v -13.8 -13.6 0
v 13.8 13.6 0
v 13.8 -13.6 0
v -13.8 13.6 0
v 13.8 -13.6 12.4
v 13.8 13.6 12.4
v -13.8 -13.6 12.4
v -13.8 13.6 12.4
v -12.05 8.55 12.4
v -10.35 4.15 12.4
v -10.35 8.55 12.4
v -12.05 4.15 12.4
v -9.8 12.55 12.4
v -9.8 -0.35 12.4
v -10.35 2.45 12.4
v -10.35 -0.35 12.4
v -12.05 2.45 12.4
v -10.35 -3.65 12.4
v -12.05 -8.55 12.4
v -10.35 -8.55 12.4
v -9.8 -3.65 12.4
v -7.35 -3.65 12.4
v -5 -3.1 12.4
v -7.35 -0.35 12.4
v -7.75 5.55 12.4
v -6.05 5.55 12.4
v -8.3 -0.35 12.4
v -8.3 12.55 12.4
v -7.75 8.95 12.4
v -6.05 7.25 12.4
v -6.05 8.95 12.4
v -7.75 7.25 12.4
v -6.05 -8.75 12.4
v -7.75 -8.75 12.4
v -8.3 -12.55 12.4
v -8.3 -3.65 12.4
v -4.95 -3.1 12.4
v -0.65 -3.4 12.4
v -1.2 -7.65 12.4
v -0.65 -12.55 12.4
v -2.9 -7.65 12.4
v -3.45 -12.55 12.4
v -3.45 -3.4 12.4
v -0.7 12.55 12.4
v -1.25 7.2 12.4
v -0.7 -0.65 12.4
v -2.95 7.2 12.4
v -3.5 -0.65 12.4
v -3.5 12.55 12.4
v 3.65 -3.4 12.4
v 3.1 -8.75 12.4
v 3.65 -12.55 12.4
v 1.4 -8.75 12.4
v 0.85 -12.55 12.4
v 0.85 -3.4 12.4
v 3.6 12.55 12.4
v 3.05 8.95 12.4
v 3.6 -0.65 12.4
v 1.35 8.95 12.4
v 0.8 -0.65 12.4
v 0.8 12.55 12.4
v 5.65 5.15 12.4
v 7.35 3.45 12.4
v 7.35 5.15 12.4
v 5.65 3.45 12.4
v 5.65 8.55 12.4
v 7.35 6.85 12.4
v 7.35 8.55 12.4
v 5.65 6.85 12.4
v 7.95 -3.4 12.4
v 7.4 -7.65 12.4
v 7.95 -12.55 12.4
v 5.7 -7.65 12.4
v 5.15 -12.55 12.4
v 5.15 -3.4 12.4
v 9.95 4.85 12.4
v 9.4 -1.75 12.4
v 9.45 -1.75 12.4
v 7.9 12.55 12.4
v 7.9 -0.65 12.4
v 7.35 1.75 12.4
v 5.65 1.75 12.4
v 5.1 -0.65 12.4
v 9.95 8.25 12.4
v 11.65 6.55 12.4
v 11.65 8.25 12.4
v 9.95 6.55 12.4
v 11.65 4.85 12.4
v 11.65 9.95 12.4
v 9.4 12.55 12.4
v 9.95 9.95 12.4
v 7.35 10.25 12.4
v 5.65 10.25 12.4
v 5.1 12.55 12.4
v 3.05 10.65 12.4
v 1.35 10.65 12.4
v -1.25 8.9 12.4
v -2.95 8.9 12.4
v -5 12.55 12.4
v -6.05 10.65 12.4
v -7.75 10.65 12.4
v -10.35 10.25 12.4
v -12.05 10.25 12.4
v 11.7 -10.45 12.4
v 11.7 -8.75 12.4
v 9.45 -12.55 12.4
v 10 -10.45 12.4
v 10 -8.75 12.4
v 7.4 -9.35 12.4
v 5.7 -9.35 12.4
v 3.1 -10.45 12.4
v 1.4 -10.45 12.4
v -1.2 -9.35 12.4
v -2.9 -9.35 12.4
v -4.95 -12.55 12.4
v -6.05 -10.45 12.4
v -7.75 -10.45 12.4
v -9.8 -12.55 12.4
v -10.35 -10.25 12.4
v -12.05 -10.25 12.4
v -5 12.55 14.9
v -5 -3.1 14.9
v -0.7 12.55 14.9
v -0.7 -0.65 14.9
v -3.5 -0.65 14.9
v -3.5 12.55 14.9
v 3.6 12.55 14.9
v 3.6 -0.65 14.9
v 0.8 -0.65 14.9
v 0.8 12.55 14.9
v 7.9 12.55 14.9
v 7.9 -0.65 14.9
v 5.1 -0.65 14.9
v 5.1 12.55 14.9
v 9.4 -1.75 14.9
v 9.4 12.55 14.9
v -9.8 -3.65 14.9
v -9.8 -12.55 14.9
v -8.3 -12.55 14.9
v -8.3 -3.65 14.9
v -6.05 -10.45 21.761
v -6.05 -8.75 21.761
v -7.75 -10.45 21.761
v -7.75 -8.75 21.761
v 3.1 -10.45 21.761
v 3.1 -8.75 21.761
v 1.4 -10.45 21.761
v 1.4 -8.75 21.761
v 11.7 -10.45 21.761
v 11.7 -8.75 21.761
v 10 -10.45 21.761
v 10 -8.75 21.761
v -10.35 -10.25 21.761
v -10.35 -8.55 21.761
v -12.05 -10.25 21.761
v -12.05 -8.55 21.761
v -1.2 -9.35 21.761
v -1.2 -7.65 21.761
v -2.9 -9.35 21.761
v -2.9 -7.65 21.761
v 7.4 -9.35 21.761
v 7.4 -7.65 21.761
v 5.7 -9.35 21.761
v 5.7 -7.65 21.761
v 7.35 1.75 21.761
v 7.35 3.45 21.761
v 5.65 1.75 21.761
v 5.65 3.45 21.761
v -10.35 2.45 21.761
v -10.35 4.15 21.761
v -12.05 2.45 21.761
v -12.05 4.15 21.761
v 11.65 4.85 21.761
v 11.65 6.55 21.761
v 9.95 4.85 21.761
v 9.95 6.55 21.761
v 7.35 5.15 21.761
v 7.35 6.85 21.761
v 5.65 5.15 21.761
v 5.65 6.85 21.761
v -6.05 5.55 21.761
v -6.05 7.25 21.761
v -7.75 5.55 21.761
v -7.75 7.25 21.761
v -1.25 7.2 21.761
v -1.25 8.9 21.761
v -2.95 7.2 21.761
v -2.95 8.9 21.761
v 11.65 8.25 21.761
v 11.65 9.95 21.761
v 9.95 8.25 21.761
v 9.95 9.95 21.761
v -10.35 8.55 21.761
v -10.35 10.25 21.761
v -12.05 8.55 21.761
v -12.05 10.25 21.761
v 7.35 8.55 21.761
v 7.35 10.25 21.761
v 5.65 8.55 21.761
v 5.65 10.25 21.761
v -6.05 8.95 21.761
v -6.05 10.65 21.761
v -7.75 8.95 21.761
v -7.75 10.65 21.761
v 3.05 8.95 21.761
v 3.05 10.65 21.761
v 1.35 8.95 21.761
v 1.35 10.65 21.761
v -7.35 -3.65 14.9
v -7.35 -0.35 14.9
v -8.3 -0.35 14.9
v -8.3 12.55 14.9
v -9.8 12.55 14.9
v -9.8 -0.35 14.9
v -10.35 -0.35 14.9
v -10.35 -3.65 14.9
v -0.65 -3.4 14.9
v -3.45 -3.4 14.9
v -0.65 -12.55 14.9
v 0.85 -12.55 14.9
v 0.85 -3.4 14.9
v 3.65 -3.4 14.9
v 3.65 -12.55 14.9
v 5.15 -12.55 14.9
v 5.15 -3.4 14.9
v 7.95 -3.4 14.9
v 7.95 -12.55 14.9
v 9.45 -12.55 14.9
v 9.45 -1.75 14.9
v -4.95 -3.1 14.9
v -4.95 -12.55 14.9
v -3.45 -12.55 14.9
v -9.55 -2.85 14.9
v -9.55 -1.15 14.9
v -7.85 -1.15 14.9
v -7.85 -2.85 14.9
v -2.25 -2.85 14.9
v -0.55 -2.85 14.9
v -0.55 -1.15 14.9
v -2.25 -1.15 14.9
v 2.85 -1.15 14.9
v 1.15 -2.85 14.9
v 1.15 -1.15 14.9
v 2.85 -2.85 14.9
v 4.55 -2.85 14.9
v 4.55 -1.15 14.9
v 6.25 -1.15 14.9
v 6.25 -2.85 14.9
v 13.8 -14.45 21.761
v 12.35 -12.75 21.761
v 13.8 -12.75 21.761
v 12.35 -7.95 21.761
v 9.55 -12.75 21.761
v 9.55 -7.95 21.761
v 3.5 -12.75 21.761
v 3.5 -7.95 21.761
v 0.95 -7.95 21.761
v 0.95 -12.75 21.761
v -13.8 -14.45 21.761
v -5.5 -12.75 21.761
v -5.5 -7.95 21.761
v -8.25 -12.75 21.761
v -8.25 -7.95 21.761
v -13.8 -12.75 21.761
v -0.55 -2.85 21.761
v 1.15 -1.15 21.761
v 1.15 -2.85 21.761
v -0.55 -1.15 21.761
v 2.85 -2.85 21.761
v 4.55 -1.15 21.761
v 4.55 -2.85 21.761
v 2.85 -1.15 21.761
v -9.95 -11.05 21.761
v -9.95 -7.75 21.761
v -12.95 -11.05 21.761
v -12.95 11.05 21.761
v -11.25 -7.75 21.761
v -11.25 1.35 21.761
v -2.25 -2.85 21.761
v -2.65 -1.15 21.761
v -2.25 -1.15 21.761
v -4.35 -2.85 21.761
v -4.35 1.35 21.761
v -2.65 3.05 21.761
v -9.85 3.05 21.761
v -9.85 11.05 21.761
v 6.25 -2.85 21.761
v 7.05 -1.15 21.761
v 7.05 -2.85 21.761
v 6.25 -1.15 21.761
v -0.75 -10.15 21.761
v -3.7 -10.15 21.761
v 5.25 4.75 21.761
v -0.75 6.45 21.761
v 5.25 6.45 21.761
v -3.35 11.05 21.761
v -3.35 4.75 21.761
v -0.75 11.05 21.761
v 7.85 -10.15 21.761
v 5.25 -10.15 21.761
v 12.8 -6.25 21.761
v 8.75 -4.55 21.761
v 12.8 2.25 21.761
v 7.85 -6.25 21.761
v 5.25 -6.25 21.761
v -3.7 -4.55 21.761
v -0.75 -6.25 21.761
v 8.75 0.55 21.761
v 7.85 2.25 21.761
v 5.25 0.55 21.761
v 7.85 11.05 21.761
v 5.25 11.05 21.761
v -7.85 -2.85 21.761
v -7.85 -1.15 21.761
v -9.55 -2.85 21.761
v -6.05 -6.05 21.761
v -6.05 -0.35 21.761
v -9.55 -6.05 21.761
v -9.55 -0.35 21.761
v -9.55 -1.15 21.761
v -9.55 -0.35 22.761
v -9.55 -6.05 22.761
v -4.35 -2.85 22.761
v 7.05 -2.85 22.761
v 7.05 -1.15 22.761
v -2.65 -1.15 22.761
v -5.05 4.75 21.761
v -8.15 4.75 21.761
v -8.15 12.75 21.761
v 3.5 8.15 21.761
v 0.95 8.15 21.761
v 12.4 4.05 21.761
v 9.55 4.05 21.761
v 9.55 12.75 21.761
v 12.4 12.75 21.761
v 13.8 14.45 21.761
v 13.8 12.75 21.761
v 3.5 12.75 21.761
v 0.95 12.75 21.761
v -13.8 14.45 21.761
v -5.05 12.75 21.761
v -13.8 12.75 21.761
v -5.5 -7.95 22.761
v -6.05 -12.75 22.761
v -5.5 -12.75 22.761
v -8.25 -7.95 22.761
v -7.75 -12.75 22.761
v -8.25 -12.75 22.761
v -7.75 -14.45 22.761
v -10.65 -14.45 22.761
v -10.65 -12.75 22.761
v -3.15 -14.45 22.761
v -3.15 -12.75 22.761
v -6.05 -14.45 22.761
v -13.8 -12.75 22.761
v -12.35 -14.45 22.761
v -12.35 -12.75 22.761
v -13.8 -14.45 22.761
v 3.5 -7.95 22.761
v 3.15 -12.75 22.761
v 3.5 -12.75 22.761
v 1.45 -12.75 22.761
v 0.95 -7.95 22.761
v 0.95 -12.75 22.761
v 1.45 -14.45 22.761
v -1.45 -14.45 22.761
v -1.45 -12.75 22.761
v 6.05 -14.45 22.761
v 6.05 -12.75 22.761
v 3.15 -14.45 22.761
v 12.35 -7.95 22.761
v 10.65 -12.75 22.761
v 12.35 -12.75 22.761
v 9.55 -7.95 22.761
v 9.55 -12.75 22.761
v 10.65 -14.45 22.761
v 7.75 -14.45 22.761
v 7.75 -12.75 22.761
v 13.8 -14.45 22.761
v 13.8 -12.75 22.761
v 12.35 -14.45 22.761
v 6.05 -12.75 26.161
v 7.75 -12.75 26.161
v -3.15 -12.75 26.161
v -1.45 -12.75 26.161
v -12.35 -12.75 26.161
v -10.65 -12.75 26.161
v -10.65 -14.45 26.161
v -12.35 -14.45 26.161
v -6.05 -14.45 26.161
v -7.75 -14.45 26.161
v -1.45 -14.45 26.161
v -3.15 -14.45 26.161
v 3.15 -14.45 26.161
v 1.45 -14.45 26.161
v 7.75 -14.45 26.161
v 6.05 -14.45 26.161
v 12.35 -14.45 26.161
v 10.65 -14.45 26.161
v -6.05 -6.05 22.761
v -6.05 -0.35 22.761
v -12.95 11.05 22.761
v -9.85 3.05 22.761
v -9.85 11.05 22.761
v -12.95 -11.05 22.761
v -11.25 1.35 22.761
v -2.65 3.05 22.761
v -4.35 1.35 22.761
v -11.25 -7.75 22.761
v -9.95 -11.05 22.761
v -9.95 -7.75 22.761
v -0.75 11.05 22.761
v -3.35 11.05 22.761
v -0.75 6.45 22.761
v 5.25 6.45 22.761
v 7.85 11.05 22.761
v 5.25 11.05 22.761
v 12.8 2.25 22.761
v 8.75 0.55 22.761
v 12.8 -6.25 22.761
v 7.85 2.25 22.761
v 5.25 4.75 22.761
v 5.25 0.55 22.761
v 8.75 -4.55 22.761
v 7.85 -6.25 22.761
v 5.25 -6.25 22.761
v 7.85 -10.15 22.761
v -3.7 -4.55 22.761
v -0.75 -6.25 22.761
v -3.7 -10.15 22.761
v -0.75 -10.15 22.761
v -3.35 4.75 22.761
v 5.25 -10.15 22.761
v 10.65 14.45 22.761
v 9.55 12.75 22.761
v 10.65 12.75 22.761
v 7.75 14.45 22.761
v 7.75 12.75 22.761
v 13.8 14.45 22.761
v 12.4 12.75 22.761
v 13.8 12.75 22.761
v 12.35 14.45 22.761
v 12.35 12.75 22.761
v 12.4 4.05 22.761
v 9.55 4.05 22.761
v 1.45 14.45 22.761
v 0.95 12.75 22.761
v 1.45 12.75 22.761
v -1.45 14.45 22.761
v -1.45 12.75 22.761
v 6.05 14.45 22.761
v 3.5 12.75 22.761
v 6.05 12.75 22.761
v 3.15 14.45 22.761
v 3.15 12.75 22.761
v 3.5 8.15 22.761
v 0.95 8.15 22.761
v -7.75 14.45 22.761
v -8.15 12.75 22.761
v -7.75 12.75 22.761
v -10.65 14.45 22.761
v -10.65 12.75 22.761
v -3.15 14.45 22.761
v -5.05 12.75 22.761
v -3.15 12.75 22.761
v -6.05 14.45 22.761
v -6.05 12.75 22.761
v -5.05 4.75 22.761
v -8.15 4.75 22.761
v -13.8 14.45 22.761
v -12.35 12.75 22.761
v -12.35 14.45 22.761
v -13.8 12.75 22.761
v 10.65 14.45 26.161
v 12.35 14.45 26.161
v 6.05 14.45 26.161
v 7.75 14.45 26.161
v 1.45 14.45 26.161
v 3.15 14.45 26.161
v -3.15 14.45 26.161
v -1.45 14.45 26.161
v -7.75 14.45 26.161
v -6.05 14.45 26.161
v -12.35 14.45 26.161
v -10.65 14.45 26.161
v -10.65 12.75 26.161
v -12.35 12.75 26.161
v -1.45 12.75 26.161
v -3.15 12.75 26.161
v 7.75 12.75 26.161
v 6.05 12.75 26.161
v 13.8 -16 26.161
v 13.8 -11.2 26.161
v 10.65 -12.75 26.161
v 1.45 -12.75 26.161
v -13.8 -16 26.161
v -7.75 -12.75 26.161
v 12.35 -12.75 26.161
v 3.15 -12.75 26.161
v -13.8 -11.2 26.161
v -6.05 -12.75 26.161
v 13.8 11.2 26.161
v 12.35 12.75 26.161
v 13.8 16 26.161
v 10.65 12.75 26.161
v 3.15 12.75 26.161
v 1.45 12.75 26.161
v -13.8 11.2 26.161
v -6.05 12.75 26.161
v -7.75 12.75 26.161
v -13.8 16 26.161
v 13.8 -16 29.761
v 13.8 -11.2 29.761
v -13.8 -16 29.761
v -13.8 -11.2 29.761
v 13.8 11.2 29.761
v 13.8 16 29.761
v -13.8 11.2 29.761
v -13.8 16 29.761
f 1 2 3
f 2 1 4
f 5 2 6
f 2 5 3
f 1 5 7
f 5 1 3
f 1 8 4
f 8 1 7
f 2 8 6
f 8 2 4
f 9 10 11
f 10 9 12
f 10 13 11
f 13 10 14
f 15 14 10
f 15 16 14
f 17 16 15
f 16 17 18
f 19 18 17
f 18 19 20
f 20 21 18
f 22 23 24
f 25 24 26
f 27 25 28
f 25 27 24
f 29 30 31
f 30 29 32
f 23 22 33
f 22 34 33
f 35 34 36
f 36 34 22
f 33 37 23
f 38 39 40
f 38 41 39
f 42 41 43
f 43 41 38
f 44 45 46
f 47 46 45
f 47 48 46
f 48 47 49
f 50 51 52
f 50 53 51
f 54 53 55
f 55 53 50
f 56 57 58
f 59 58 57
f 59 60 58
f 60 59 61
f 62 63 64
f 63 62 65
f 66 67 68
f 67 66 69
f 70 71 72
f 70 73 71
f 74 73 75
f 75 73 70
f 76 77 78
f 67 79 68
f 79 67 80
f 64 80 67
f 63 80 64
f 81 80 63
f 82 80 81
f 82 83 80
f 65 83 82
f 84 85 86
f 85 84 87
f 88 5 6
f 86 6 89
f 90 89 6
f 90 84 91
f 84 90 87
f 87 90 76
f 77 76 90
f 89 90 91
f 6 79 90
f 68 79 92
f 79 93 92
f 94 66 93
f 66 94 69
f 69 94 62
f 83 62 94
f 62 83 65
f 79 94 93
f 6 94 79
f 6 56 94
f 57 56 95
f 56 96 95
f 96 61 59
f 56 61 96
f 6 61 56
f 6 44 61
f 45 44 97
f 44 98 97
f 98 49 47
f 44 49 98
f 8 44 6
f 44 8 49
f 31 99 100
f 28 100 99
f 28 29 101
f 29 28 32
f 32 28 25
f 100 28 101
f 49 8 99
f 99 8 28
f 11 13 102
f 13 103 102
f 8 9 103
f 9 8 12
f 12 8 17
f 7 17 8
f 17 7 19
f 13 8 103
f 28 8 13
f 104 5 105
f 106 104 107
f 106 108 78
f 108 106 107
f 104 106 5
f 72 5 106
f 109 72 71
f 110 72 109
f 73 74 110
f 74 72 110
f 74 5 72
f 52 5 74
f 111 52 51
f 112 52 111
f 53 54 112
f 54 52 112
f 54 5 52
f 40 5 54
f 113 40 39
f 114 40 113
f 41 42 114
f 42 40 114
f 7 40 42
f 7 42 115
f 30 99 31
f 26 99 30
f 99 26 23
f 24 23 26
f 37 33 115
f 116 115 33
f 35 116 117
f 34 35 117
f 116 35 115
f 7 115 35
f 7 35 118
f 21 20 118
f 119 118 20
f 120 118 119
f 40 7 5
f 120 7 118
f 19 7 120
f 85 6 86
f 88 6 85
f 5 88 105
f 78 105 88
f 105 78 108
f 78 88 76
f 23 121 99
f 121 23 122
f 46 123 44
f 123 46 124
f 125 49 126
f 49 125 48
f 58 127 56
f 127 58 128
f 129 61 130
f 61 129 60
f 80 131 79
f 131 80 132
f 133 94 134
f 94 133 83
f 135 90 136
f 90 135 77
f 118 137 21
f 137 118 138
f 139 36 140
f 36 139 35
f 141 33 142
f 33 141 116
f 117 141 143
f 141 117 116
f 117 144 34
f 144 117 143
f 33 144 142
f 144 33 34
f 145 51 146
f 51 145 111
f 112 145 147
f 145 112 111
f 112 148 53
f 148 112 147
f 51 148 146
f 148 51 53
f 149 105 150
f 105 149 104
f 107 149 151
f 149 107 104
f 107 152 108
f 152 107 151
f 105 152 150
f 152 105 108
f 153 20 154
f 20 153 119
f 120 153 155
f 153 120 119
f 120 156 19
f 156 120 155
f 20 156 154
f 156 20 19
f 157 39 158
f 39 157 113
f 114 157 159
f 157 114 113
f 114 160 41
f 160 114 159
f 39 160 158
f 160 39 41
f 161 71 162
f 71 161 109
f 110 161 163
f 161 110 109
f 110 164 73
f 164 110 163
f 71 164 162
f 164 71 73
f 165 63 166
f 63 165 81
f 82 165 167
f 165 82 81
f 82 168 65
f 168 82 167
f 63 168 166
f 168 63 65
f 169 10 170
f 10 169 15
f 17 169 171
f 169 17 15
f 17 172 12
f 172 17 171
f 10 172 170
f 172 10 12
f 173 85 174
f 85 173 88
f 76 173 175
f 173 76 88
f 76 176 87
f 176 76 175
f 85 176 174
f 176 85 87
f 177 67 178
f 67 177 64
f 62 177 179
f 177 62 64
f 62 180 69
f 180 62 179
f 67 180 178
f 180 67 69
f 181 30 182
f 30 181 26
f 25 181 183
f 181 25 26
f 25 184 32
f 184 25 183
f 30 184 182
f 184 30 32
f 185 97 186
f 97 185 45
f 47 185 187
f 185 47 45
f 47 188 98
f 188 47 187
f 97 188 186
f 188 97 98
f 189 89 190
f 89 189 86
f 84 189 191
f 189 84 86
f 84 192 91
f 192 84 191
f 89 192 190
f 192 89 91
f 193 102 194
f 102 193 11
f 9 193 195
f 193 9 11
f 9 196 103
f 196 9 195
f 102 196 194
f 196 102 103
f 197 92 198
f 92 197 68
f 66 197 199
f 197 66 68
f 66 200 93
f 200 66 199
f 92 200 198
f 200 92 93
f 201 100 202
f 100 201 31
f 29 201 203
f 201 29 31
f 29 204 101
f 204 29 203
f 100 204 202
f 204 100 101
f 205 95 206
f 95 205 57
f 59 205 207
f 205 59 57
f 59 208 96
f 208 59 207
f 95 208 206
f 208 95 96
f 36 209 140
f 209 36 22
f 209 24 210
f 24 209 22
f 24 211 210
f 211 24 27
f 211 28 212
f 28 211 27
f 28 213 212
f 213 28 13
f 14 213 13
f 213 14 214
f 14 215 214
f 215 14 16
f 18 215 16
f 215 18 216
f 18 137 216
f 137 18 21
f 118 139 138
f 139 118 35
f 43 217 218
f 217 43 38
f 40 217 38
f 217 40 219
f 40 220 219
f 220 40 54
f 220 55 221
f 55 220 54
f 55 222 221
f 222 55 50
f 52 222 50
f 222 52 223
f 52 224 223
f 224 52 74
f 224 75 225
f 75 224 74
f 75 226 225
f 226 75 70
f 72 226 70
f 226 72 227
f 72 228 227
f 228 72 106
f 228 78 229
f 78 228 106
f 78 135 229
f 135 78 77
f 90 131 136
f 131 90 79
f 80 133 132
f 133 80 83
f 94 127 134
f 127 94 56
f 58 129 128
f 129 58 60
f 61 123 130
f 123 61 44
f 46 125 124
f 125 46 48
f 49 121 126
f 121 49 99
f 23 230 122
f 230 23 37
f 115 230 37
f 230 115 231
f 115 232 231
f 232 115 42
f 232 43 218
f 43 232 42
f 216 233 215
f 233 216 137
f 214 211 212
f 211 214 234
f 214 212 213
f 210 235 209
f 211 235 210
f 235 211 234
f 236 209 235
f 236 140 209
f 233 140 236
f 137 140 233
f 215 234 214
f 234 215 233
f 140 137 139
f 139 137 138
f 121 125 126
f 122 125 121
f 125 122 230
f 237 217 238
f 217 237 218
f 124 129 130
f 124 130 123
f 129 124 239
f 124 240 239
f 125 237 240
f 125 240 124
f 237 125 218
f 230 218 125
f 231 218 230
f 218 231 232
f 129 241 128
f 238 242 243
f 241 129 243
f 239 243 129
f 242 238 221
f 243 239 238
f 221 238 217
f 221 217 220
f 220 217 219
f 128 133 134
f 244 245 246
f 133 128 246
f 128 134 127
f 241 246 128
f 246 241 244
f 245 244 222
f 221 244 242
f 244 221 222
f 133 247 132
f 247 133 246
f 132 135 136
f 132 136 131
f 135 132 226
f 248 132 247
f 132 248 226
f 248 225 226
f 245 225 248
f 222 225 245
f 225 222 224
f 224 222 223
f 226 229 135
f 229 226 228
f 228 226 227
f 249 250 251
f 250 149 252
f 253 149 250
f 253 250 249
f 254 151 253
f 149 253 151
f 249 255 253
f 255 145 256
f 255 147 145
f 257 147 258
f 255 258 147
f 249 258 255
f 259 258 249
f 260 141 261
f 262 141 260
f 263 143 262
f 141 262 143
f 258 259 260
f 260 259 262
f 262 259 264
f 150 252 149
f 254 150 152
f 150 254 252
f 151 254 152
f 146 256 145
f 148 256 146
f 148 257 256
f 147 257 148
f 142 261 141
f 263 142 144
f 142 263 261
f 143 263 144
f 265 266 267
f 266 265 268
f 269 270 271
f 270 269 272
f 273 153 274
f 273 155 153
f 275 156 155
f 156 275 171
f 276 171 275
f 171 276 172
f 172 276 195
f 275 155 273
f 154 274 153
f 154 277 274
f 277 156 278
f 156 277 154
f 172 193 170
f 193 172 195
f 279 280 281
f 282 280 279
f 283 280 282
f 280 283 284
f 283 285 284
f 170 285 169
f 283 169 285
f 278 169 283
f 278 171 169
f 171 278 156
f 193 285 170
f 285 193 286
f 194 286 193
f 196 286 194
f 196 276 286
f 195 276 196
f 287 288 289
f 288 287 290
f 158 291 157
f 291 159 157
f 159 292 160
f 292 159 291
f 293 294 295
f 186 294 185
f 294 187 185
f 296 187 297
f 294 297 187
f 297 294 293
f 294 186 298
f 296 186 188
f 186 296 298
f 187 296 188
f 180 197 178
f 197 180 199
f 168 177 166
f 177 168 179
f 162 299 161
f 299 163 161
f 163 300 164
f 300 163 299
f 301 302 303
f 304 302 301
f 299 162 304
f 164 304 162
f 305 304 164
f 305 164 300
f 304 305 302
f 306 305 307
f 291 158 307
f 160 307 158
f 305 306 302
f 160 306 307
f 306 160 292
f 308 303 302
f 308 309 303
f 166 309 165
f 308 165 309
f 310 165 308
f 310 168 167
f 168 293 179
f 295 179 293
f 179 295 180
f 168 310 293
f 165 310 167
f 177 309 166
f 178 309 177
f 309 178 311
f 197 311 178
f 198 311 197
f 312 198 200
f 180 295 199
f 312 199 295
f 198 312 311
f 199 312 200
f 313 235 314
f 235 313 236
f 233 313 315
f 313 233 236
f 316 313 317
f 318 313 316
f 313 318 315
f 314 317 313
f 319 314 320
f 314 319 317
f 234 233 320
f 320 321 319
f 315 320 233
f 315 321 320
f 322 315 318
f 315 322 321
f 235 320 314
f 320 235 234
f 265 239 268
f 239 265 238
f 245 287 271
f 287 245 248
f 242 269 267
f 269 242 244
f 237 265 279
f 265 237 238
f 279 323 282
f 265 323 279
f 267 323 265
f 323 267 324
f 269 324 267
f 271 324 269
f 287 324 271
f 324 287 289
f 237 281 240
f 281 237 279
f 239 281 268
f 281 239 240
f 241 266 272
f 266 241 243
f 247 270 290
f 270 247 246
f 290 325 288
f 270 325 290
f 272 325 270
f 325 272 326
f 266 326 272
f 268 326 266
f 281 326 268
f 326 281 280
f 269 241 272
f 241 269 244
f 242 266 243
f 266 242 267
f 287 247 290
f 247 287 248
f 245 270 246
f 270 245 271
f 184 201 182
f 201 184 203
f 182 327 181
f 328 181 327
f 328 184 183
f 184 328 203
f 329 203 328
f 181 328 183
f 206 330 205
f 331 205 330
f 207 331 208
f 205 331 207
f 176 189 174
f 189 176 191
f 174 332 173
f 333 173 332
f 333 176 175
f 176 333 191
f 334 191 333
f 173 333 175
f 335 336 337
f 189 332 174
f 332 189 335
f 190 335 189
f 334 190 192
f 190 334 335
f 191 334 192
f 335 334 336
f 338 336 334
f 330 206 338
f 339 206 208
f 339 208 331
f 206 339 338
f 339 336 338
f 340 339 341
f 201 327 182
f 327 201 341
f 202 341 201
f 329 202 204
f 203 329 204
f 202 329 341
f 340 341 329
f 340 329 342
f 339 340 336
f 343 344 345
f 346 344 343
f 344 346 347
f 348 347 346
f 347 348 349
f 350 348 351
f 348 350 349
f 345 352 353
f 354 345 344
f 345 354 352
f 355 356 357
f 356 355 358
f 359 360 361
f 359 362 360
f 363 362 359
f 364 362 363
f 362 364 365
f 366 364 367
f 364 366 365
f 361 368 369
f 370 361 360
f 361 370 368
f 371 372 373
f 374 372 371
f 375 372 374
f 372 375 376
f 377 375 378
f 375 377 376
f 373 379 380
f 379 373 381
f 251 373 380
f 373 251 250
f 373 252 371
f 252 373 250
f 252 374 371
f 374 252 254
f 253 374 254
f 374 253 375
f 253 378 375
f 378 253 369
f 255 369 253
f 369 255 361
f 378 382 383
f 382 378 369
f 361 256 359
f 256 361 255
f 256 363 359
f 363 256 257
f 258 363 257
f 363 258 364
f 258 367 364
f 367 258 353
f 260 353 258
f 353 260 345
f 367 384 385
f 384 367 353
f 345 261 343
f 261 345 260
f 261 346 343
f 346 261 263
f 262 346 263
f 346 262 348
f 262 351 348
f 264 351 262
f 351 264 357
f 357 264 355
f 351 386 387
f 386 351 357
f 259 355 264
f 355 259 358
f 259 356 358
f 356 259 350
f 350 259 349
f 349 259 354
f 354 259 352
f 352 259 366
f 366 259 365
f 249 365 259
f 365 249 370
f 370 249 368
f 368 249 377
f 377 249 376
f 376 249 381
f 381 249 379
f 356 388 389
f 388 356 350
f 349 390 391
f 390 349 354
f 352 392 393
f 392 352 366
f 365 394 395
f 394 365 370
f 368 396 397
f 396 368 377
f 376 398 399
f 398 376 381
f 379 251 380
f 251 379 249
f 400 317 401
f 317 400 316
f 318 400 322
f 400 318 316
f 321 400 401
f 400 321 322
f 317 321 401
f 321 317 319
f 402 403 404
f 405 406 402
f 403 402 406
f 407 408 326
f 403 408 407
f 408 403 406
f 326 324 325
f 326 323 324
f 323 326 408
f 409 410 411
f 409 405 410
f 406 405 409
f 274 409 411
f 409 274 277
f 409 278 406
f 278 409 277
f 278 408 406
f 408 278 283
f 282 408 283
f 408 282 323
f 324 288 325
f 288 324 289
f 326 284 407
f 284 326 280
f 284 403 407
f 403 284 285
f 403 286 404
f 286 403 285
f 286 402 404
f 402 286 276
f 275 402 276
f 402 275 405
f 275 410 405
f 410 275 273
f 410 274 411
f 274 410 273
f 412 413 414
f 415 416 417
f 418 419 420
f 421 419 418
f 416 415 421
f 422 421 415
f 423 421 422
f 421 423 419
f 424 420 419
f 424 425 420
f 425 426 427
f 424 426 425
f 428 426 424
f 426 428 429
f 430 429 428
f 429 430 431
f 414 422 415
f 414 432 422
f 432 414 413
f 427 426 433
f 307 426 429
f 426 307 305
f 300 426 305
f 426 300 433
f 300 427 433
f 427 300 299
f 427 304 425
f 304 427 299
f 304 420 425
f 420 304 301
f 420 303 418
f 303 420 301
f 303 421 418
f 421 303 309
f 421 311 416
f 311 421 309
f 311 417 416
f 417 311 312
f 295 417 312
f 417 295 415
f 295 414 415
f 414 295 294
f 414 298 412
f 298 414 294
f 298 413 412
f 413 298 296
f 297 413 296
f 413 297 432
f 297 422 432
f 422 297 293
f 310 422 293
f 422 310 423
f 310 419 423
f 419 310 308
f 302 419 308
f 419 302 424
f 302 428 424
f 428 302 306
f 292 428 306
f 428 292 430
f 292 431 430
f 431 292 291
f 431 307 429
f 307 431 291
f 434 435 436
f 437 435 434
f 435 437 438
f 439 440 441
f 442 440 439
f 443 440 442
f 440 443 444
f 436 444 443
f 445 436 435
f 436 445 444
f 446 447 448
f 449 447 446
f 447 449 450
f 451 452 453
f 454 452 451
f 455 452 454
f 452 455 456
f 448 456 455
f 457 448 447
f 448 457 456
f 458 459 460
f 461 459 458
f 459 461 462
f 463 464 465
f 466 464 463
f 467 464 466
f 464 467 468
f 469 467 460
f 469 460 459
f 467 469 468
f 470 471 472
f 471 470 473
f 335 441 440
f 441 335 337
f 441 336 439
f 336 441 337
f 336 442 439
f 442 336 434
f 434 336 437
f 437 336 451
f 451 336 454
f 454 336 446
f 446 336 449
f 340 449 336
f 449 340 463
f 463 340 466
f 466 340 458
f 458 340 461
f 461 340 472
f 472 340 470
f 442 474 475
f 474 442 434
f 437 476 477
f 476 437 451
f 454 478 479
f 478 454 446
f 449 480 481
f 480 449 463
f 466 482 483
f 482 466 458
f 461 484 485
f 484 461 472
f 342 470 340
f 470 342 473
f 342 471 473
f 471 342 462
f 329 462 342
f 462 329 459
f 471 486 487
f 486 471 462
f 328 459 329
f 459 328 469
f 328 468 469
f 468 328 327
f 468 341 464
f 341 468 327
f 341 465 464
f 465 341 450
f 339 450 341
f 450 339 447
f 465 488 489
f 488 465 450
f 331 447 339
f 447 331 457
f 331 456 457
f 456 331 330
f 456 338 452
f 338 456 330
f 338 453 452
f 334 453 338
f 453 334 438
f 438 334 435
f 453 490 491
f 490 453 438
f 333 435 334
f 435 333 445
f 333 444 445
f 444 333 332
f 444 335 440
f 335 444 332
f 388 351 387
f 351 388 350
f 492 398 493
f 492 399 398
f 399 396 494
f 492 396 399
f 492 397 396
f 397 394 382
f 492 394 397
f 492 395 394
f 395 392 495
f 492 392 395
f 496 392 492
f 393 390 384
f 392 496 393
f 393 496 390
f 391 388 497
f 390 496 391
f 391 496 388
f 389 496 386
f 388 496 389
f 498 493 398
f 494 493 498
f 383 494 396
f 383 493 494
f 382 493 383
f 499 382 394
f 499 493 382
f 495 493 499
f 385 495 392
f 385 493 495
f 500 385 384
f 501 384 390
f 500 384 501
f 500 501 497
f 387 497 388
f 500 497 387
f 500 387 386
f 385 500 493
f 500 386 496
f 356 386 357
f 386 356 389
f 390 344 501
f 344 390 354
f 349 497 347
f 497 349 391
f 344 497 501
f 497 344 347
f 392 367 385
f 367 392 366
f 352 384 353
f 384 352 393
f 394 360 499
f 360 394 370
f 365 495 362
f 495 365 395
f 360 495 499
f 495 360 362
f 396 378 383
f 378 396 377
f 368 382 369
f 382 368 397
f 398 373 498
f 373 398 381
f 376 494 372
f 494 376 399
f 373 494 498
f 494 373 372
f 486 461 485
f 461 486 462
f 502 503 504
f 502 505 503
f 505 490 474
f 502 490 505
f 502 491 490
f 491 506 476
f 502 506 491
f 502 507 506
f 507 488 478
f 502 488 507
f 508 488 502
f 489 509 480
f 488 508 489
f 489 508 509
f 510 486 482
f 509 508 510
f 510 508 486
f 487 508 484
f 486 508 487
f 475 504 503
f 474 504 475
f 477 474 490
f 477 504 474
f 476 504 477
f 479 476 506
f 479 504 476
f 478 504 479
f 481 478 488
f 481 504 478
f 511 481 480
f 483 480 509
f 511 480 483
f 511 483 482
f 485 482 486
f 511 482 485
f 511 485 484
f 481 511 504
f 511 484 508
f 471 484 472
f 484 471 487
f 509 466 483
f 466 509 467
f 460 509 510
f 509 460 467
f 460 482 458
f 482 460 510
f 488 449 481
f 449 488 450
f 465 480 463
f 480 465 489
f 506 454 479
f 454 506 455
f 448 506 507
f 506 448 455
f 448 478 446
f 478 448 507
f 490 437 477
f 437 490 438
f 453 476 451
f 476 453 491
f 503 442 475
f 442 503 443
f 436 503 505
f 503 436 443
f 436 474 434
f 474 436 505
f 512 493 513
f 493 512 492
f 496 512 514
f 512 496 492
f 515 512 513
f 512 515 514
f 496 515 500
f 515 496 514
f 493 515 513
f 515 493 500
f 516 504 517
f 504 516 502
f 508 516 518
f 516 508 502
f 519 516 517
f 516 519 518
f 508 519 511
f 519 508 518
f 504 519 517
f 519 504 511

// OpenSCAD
// Generated by SolidPython 0.4.2 on 2020-09-29 23:20:18
//!OpenSCAD

scale(v = 0.0100000000) {
	translate(v = [-1380, -1360, 0]) {
		union() {
			color(c = [0.4000000000, 0.4000000000, 0.4000000000]) {
				translate(v = [0, 0, 0]) {
					linear_extrude(height = 1000.0000000000) {
						polygon(paths = [[0, 1, 2, 3]], points = [[0, 0], [0, 2720], [2760, 2720], [2760, 0]]);
					}
				}
			}
			color(c = [0.2000000000, 0.6000000000, 0.2000000000]) {
				translate(v = [0, 0, 1000.0000000000]) {
					linear_extrude(height = 120.0000000000) {
						polygon(paths = [[0, 1, 2, 3]], points = [[0, 1305], [0, 2720], [2760, 2720], [2760, 1305]]);
					}
				}
			}
			color(c = [0.4000000000, 0.4000000000, 0.4000000000]) {
				translate(v = [0, 0, 1000.0000000000]) {
					linear_extrude(height = 120.0000000000) {
						polygon(paths = [[0, 1, 2, 3]], points = [[0, 0], [0, 1305], [2760, 1305], [2760, 0]]);
					}
				}
			}
			color(c = [0.9000000000, 0.6000000000, 0.6000000000]) {
				translate(v = [0, 0, 1120.0000000000]) {
					linear_extrude(height = 120.0000000000) {
						polygon(paths = [[0, 1, 2, 3]], points = [[135, 1485], [135, 2485], [400, 2485], [400, 1485]]);
					}
				}
			}
			color(c = [0.9000000000, 0.6000000000, 0.6000000000]) {
				translate(v = [0, 0, 1120.0000000000]) {
					linear_extrude(height = 120.0000000000) {
						polygon(paths = [[0, 1, 2, 3]], points = [[550, 1485], [550, 2485], [880, 2485], [880, 1485]]);
					}
				}
			}
			color(c = [0.9000000000, 0.6000000000, 0.6000000000]) {
				translate(v = [0, 0, 1120.0000000000]) {
					linear_extrude(height = 120.0000000000) {
						polygon(paths = [[0, 1, 2, 3]], points = [[1030, 1485], [1030, 2485], [1310, 2485], [1310, 1485]]);
					}
				}
			}
			color(c = [0.9000000000, 0.6000000000, 0.6000000000]) {
				translate(v = [0, 0, 1120.0000000000]) {
					linear_extrude(height = 120.0000000000) {
						polygon(paths = [[0, 1, 2, 3]], points = [[1460, 1485], [1460, 2485], [1740, 2485], [1740, 1485]]);
					}
				}
			}
			color(c = [0.9000000000, 0.6000000000, 0.6000000000]) {
				translate(v = [0, 0, 1120.0000000000]) {
					linear_extrude(height = 120.0000000000) {
						polygon(paths = [[0, 1, 2, 3]], points = [[1890, 1485], [1890, 2485], [2170, 2485], [2170, 1485]]);
					}
				}
			}
			color(c = [0.9000000000, 0.6000000000, 0.6000000000]) {
				translate(v = [0, 0, 1120.0000000000]) {
					linear_extrude(height = 120.0000000000) {
						polygon(paths = [[0, 1, 2, 3]], points = [[2320, 1485], [2320, 2485], [2620, 2485], [2620, 1485]]);
					}
				}
			}
			color(c = [0.9000000000, 0.6000000000, 0.9000000000]) {
				translate(v = [0, 0, 1120.0000000000]) {
					linear_extrude(height = 120.0000000000) {
						polygon(paths = [[0, 1, 2, 3]], points = [[135, 235], [135, 655], [400, 655], [400, 235]]);
					}
				}
			}
			color(c = [0.9000000000, 0.6000000000, 0.9000000000]) {
				translate(v = [0, 0, 1120.0000000000]) {
					linear_extrude(height = 120.0000000000) {
						polygon(paths = [[0, 1, 2, 3]], points = [[550, 235], [550, 655], [885, 655], [885, 235]]);
					}
				}
			}
			color(c = [0.9000000000, 0.6000000000, 0.9000000000]) {
				translate(v = [0, 0, 1120.0000000000]) {
					linear_extrude(height = 120.0000000000) {
						polygon(paths = [[0, 1, 2, 3]], points = [[1035, 235], [1035, 655], [1315, 655], [1315, 235]]);
					}
				}
			}
			color(c = [0.9000000000, 0.6000000000, 0.9000000000]) {
				translate(v = [0, 0, 1120.0000000000]) {
					linear_extrude(height = 120.0000000000) {
						polygon(paths = [[0, 1, 2, 3]], points = [[1465, 235], [1465, 655], [1745, 655], [1745, 235]]);
					}
				}
			}
			color(c = [0.9000000000, 0.6000000000, 0.9000000000]) {
				translate(v = [0, 0, 1120.0000000000]) {
					linear_extrude(height = 120.0000000000) {
						polygon(paths = [[0, 1, 2, 3]], points = [[1895, 235], [1895, 655], [2175, 655], [2175, 235]]);
					}
				}
			}
			color(c = [0.9000000000, 0.6000000000, 0.9000000000]) {
				translate(v = [0, 0, 1120.0000000000]) {
					linear_extrude(height = 120.0000000000) {
						polygon(paths = [[0, 1, 2, 3]], points = [[2325, 235], [2325, 655], [2615, 655], [2615, 235]]);
					}
				}
			}
			color(c = [0.2000000000, 0.6000000000, 0.2000000000]) {
				translate(v = [0, 0, 1120.0000000000]) {
					linear_extrude(height = 120.0000000000) {
						difference() {
							polygon(paths = [[0, 1, 2, 3]], points = [[0, 1305], [0, 2720], [2760, 2720], [2760, 1305]]);
							polygon(paths = [[0, 1, 2, 3]], points = [[135, 1485], [400, 1485], [400, 2485], [135, 2485]]);
							polygon(paths = [[0, 1, 2, 3]], points = [[550, 1485], [880, 1485], [880, 2485], [550, 2485]]);
							polygon(paths = [[0, 1, 2, 3]], points = [[1030, 1485], [1310, 1485], [1310, 2485], [1030, 2485]]);
							polygon(paths = [[0, 1, 2, 3]], points = [[1460, 1485], [1740, 1485], [1740, 2485], [1460, 2485]]);
							polygon(paths = [[0, 1, 2, 3]], points = [[1890, 1485], [2170, 1485], [2170, 2485], [1890, 2485]]);
							polygon(paths = [[0, 1, 2, 3]], points = [[2320, 1485], [2620, 1485], [2620, 2485], [2320, 2485]]);
						}
					}
				}
			}
			color(c = [0.4000000000, 0.4000000000, 0.4000000000]) {
				translate(v = [0, 0, 1120.0000000000]) {
					linear_extrude(height = 120.0000000000) {
						difference() {
							polygon(paths = [[0, 1, 2, 3]], points = [[0, 0], [0, 1305], [2760, 1305], [2760, 0]]);
							polygon(paths = [[0, 1, 2, 3]], points = [[135, 235], [400, 235], [400, 655], [135, 655]]);
							polygon(paths = [[0, 1, 2, 3]], points = [[550, 235], [885, 235], [885, 655], [550, 655]]);
							polygon(paths = [[0, 1, 2, 3]], points = [[1035, 235], [1315, 235], [1315, 655], [1035, 655]]);
							polygon(paths = [[0, 1, 2, 3]], points = [[1465, 235], [1745, 235], [1745, 655], [1465, 655]]);
							polygon(paths = [[0, 1, 2, 3]], points = [[1895, 235], [2175, 235], [2175, 655], [1895, 655]]);
							polygon(paths = [[0, 1, 2, 3]], points = [[2325, 235], [2615, 235], [2615, 655], [2325, 655]]);
						}
					}
				}
			}
			color(c = [0.1000000000, 0.1000000000, 0.1000000000]) {
				translate(v = [0, 0, 1240.0000000000]) {
					linear_extrude(height = 70.0000000000) {
						polygon(paths = [[0, 1, 2, 3]], points = [[605, 315], [605, 485], [775, 485], [775, 315]]);
					}
				}
			}
			color(c = [0.1000000000, 0.1000000000, 0.1000000000]) {
				translate(v = [0, 0, 1240.0000000000]) {
					linear_extrude(height = 70.0000000000) {
						polygon(paths = [[0, 1, 2, 3]], points = [[1520, 315], [1520, 485], [1690, 485], [1690, 315]]);
					}
				}
			}
			color(c = [0.1000000000, 0.1000000000, 0.1000000000]) {
				translate(v = [0, 0, 1240.0000000000]) {
					linear_extrude(height = 70.0000000000) {
						polygon(paths = [[0, 1, 2, 3]], points = [[2380, 315], [2380, 485], [2550, 485], [2550, 315]]);
					}
				}
			}
			color(c = [0.1000000000, 0.1000000000, 0.1000000000]) {
				translate(v = [0, 0, 1240.0000000000]) {
					linear_extrude(height = 70.0000000000) {
						polygon(paths = [[0, 1, 2, 3]], points = [[175, 335], [175, 505], [345, 505], [345, 335]]);
					}
				}
			}
			color(c = [0.1000000000, 0.1000000000, 0.1000000000]) {
				translate(v = [0, 0, 1240.0000000000]) {
					linear_extrude(height = 70.0000000000) {
						polygon(paths = [[0, 1, 2, 3]], points = [[1090, 425], [1090, 595], [1260, 595], [1260, 425]]);
					}
				}
			}
			color(c = [0.1000000000, 0.1000000000, 0.1000000000]) {
				translate(v = [0, 0, 1240.0000000000]) {
					linear_extrude(height = 70.0000000000) {
						polygon(paths = [[0, 1, 2, 3]], points = [[1950, 425], [1950, 595], [2120, 595], [2120, 425]]);
					}
				}
			}
			color(c = [0.1000000000, 0.1000000000, 0.1000000000]) {
				translate(v = [0, 0, 1240.0000000000]) {
					linear_extrude(height = 70.0000000000) {
						polygon(paths = [[0, 1, 2, 3]], points = [[1945, 1535], [1945, 1705], [2115, 1705], [2115, 1535]]);
					}
				}
			}
			color(c = [0.1000000000, 0.1000000000, 0.1000000000]) {
				translate(v = [0, 0, 1240.0000000000]) {
					linear_extrude(height = 70.0000000000) {
						polygon(paths = [[0, 1, 2, 3]], points = [[175, 1605], [175, 1775], [345, 1775], [345, 1605]]);
					}
				}
			}
			color(c = [0.1000000000, 0.1000000000, 0.1000000000]) {
				translate(v = [0, 0, 1240.0000000000]) {
					linear_extrude(height = 70.0000000000) {
						polygon(paths = [[0, 1, 2, 3]], points = [[2375, 1845], [2375, 2015], [2545, 2015], [2545, 1845]]);
					}
				}
			}
			color(c = [0.1000000000, 0.1000000000, 0.1000000000]) {
				translate(v = [0, 0, 1240.0000000000]) {
					linear_extrude(height = 70.0000000000) {
						polygon(paths = [[0, 1, 2, 3]], points = [[1945, 1875], [1945, 2045], [2115, 2045], [2115, 1875]]);
					}
				}
			}
			color(c = [0.1000000000, 0.1000000000, 0.1000000000]) {
				translate(v = [0, 0, 1240.0000000000]) {
					linear_extrude(height = 70.0000000000) {
						polygon(paths = [[0, 1, 2, 3]], points = [[605, 1915], [605, 2085], [775, 2085], [775, 1915]]);
					}
				}
			}
			color(c = [0.1000000000, 0.1000000000, 0.1000000000]) {
				translate(v = [0, 0, 1240.0000000000]) {
					linear_extrude(height = 70.0000000000) {
						polygon(paths = [[0, 1, 2, 3]], points = [[1085, 2080], [1085, 2250], [1255, 2250], [1255, 2080]]);
					}
				}
			}
			color(c = [0.1000000000, 0.1000000000, 0.1000000000]) {
				translate(v = [0, 0, 1240.0000000000]) {
					linear_extrude(height = 70.0000000000) {
						polygon(paths = [[0, 1, 2, 3]], points = [[2375, 2185], [2375, 2355], [2545, 2355], [2545, 2185]]);
					}
				}
			}
			color(c = [0.1000000000, 0.1000000000, 0.1000000000]) {
				translate(v = [0, 0, 1240.0000000000]) {
					linear_extrude(height = 70.0000000000) {
						polygon(paths = [[0, 1, 2, 3]], points = [[175, 2215], [175, 2385], [345, 2385], [345, 2215]]);
					}
				}
			}
			color(c = [0.1000000000, 0.1000000000, 0.1000000000]) {
				translate(v = [0, 0, 1240.0000000000]) {
					linear_extrude(height = 70.0000000000) {
						polygon(paths = [[0, 1, 2, 3]], points = [[1945, 2215], [1945, 2385], [2115, 2385], [2115, 2215]]);
					}
				}
			}
			color(c = [0.1000000000, 0.1000000000, 0.1000000000]) {
				translate(v = [0, 0, 1240.0000000000]) {
					linear_extrude(height = 70.0000000000) {
						polygon(paths = [[0, 1, 2, 3]], points = [[605, 2255], [605, 2425], [775, 2425], [775, 2255]]);
					}
				}
			}
			color(c = [0.1000000000, 0.1000000000, 0.1000000000]) {
				translate(v = [0, 0, 1240.0000000000]) {
					linear_extrude(height = 70.0000000000) {
						polygon(paths = [[0, 1, 2, 3]], points = [[1515, 2255], [1515, 2425], [1685, 2425], [1685, 2255]]);
					}
				}
			}
			color(c = [1.0000000000, 1.0000000000, 1.0000000000]) {
				translate(v = [0, 0, 1240.0000000000]) {
					linear_extrude(height = 70.0000000000) {
						polygon(paths = [[0, 1, 2, 3, 4, 5, 6, 7, 8, 9, 10, 11]], points = [[400, 105], [400, 995], [345, 995], [345, 1325], [400, 1325], [400, 2615], [550, 2615], [550, 1325], [645, 1325], [645, 995], [550, 995], [550, 105]]);
					}
				}
			}
			color(c = [1.0000000000, 1.0000000000, 1.0000000000]) {
				translate(v = [0, 0, 1240.0000000000]) {
					linear_extrude(height = 70.0000000000) {
						polygon(paths = [[0, 1, 2, 3, 4, 5, 6, 7, 8, 9, 10, 11, 12, 13, 14, 15, 16, 17, 18, 19, 20, 21, 22, 23, 24, 25, 26, 27, 28, 29, 30, 31]], points = [[885, 105], [885, 1050], [880, 1050], [880, 2615], [1030, 2615], [1030, 1295], [1310, 1295], [1310, 2615], [1460, 2615], [1460, 1295], [1740, 1295], [1740, 2615], [1890, 2615], [1890, 1295], [2170, 1295], [2170, 2615], [2320, 2615], [2320, 1185], [2325, 1185], [2325, 105], [2175, 105], [2175, 1020], [1895, 1020], [1895, 105], [1745, 105], [1745, 1020], [1465, 1020], [1465, 105], [1315, 105], [1315, 1020], [1035, 1020], [1035, 105]]);
					}
				}
			}
			color(c = [0.1000000000, 0.1000000000, 0.1000000000]) {
				translate(v = [0, 0, 1310.0000000000]) {
					linear_extrude(height = 180.0000000000) {
						polygon(paths = [[0, 1, 2, 3]], points = [[605, 315], [605, 485], [775, 485], [775, 315]]);
					}
				}
			}
			color(c = [0.1000000000, 0.1000000000, 0.1000000000]) {
				translate(v = [0, 0, 1310.0000000000]) {
					linear_extrude(height = 180.0000000000) {
						polygon(paths = [[0, 1, 2, 3]], points = [[1520, 315], [1520, 485], [1690, 485], [1690, 315]]);
					}
				}
			}
			color(c = [0.1000000000, 0.1000000000, 0.1000000000]) {
				translate(v = [0, 0, 1310.0000000000]) {
					linear_extrude(height = 180.0000000000) {
						polygon(paths = [[0, 1, 2, 3]], points = [[2380, 315], [2380, 485], [2550, 485], [2550, 315]]);
					}
				}
			}
			color(c = [0.1000000000, 0.1000000000, 0.1000000000]) {
				translate(v = [0, 0, 1310.0000000000]) {
					linear_extrude(height = 180.0000000000) {
						polygon(paths = [[0, 1, 2, 3]], points = [[175, 335], [175, 505], [345, 505], [345, 335]]);
					}
				}
			}
			color(c = [0.1000000000, 0.1000000000, 0.1000000000]) {
				translate(v = [0, 0, 1310.0000000000]) {
					linear_extrude(height = 180.0000000000) {
						polygon(paths = [[0, 1, 2, 3]], points = [[1090, 425], [1090, 595], [1260, 595], [1260, 425]]);
					}
				}
			}
			color(c = [0.1000000000, 0.1000000000, 0.1000000000]) {
				translate(v = [0, 0, 1310.0000000000]) {
					linear_extrude(height = 180.0000000000) {
						polygon(paths = [[0, 1, 2, 3]], points = [[1950, 425], [1950, 595], [2120, 595], [2120, 425]]);
					}
				}
			}
			color(c = [0.1000000000, 0.1000000000, 0.1000000000]) {
				translate(v = [0, 0, 1310.0000000000]) {
					linear_extrude(height = 180.0000000000) {
						polygon(paths = [[0, 1, 2, 3]], points = [[1945, 1535], [1945, 1705], [2115, 1705], [2115, 1535]]);
					}
				}
			}
			color(c = [0.1000000000, 0.1000000000, 0.1000000000]) {
				translate(v = [0, 0, 1310.0000000000]) {
					linear_extrude(height = 180.0000000000) {
						polygon(paths = [[0, 1, 2, 3]], points = [[175, 1605], [175, 1775], [345, 1775], [345, 1605]]);
					}
				}
			}
			color(c = [0.1000000000, 0.1000000000, 0.1000000000]) {
				translate(v = [0, 0, 1310.0000000000]) {
					linear_extrude(height = 180.0000000000) {
						polygon(paths = [[0, 1, 2, 3]], points = [[2375, 1845], [2375, 2015], [2545, 2015], [2545, 1845]]);
					}
				}
			}
			color(c = [0.1000000000, 0.1000000000, 0.1000000000]) {
				translate(v = [0, 0, 1310.0000000000]) {
					linear_extrude(height = 180.0000000000) {
						polygon(paths = [[0, 1, 2, 3]], points = [[1945, 1875], [1945, 2045], [2115, 2045], [2115, 1875]]);
					}
				}
			}
			color(c = [0.1000000000, 0.1000000000, 0.1000000000]) {
				translate(v = [0, 0, 1310.0000000000]) {
					linear_extrude(height = 180.0000000000) {
						polygon(paths = [[0, 1, 2, 3]], points = [[605, 1915], [605, 2085], [775, 2085], [775, 1915]]);
					}
				}
			}
			color(c = [0.1000000000, 0.1000000000, 0.1000000000]) {
				translate(v = [0, 0, 1310.0000000000]) {
					linear_extrude(height = 180.0000000000) {
						polygon(paths = [[0, 1, 2, 3]], points = [[1085, 2080], [1085, 2250], [1255, 2250], [1255, 2080]]);
					}
				}
			}
			color(c = [0.1000000000, 0.1000000000, 0.1000000000]) {
				translate(v = [0, 0, 1310.0000000000]) {
					linear_extrude(height = 180.0000000000) {
						polygon(paths = [[0, 1, 2, 3]], points = [[2375, 2185], [2375, 2355], [2545, 2355], [2545, 2185]]);
					}
				}
			}
			color(c = [0.1000000000, 0.1000000000, 0.1000000000]) {
				translate(v = [0, 0, 1310.0000000000]) {
					linear_extrude(height = 180.0000000000) {
						polygon(paths = [[0, 1, 2, 3]], points = [[175, 2215], [175, 2385], [345, 2385], [345, 2215]]);
					}
				}
			}
			color(c = [0.1000000000, 0.1000000000, 0.1000000000]) {
				translate(v = [0, 0, 1310.0000000000]) {
					linear_extrude(height = 180.0000000000) {
						polygon(paths = [[0, 1, 2, 3]], points = [[1945, 2215], [1945, 2385], [2115, 2385], [2115, 2215]]);
					}
				}
			}
			color(c = [0.1000000000, 0.1000000000, 0.1000000000]) {
				translate(v = [0, 0, 1310.0000000000]) {
					linear_extrude(height = 180.0000000000) {
						polygon(paths = [[0, 1, 2, 3]], points = [[605, 2255], [605, 2425], [775, 2425], [775, 2255]]);
					}
				}
			}
			color(c = [0.1000000000, 0.1000000000, 0.1000000000]) {
				translate(v = [0, 0, 1310.0000000000]) {
					linear_extrude(height = 180.0000000000) {
						polygon(paths = [[0, 1, 2, 3]], points = [[1515, 2255], [1515, 2425], [1685, 2425], [1685, 2255]]);
					}
				}
			}
			color(c = [0.7000000000, 0, 0]) {
				translate(v = [0, 0, 1310.0000000000]) {
					linear_extrude(height = 180.0000000000) {
						polygon(paths = [[0, 1, 2, 3, 4, 5, 6, 7, 8, 9, 10, 11]], points = [[400, 105], [400, 995], [345, 995], [345, 1325], [400, 1325], [400, 2615], [550, 2615], [550, 1325], [645, 1325], [645, 995], [550, 995], [550, 105]]);
					}
				}
			}
			color(c = [0.7000000000, 0, 0]) {
				translate(v = [0, 0, 1310.0000000000]) {
					linear_extrude(height = 180.0000000000) {
						polygon(paths = [[0, 1, 2, 3, 4, 5, 6, 7, 8, 9, 10, 11, 12, 13, 14, 15, 16, 17, 18, 19, 20, 21, 22, 23, 24, 25, 26, 27, 28, 29, 30, 31]], points = [[885, 105], [885, 1050], [880, 1050], [880, 2615], [1030, 2615], [1030, 1295], [1310, 1295], [1310, 2615], [1460, 2615], [1460, 1295], [1740, 1295], [1740, 2615], [1890, 2615], [1890, 1295], [2170, 1295], [2170, 2615], [2320, 2615], [2320, 1185], [2325, 1185], [2325, 105], [2175, 105], [2175, 1020], [1895, 1020], [1895, 105], [1745, 105], [1745, 1020], [1465, 1020], [1465, 105], [1315, 105], [1315, 1020], [1035, 1020], [1035, 105]]);
					}
				}
			}
			color(c = [0.1000000000, 0.1000000000, 0.1000000000]) {
				translate(v = [0, 0, 1490.0000000000]) {
					linear_extrude(height = 686.1000000000) {
						polygon(paths = [[0, 1, 2, 3]], points = [[605, 315], [605, 485], [775, 485], [775, 315]]);
					}
				}
			}
			color(c = [0.1000000000, 0.1000000000, 0.1000000000]) {
				translate(v = [0, 0, 1490.0000000000]) {
					linear_extrude(height = 686.1000000000) {
						polygon(paths = [[0, 1, 2, 3]], points = [[1520, 315], [1520, 485], [1690, 485], [1690, 315]]);
					}
				}
			}
			color(c = [0.1000000000, 0.1000000000, 0.1000000000]) {
				translate(v = [0, 0, 1490.0000000000]) {
					linear_extrude(height = 686.1000000000) {
						polygon(paths = [[0, 1, 2, 3]], points = [[2380, 315], [2380, 485], [2550, 485], [2550, 315]]);
					}
				}
			}
			color(c = [0.1000000000, 0.1000000000, 0.1000000000]) {
				translate(v = [0, 0, 1490.0000000000]) {
					linear_extrude(height = 686.1000000000) {
						polygon(paths = [[0, 1, 2, 3]], points = [[175, 335], [175, 505], [345, 505], [345, 335]]);
					}
				}
			}
			color(c = [0.1000000000, 0.1000000000, 0.1000000000]) {
				translate(v = [0, 0, 1490.0000000000]) {
					linear_extrude(height = 686.1000000000) {
						polygon(paths = [[0, 1, 2, 3]], points = [[1090, 425], [1090, 595], [1260, 595], [1260, 425]]);
					}
				}
			}
			color(c = [0.1000000000, 0.1000000000, 0.1000000000]) {
				translate(v = [0, 0, 1490.0000000000]) {
					linear_extrude(height = 686.1000000000) {
						polygon(paths = [[0, 1, 2, 3]], points = [[1950, 425], [1950, 595], [2120, 595], [2120, 425]]);
					}
				}
			}
			color(c = [0.1000000000, 0.1000000000, 0.1000000000]) {
				translate(v = [0, 0, 1490.0000000000]) {
					linear_extrude(height = 686.1000000000) {
						polygon(paths = [[0, 1, 2, 3]], points = [[425, 1075], [425, 1245], [595, 1245], [595, 1075]]);
					}
				}
			}
			color(c = [0.1000000000, 0.1000000000, 0.1000000000]) {
				translate(v = [0, 0, 1490.0000000000]) {
					linear_extrude(height = 686.1000000000) {
						polygon(paths = [[0, 1, 2, 3]], points = [[1155, 1075], [1155, 1245], [1325, 1245], [1325, 1075]]);
					}
				}
			}
			color(c = [0.1000000000, 0.1000000000, 0.1000000000]) {
				translate(v = [0, 0, 1490.0000000000]) {
					linear_extrude(height = 686.1000000000) {
						polygon(paths = [[0, 1, 2, 3]], points = [[1495, 1075], [1495, 1245], [1665, 1245], [1665, 1075]]);
					}
				}
			}
			color(c = [0.1000000000, 0.1000000000, 0.1000000000]) {
				translate(v = [0, 0, 1490.0000000000]) {
					linear_extrude(height = 686.1000000000) {
						polygon(paths = [[0, 1, 2, 3]], points = [[1835, 1075], [1835, 1245], [2005, 1245], [2005, 1075]]);
					}
				}
			}
			color(c = [0.1000000000, 0.1000000000, 0.1000000000]) {
				translate(v = [0, 0, 1490.0000000000]) {
					linear_extrude(height = 686.1000000000) {
						polygon(paths = [[0, 1, 2, 3]], points = [[1945, 1535], [1945, 1705], [2115, 1705], [2115, 1535]]);
					}
				}
			}
			color(c = [0.1000000000, 0.1000000000, 0.1000000000]) {
				translate(v = [0, 0, 1490.0000000000]) {
					linear_extrude(height = 686.1000000000) {
						polygon(paths = [[0, 1, 2, 3]], points = [[175, 1605], [175, 1775], [345, 1775], [345, 1605]]);
					}
				}
			}
			color(c = [0.1000000000, 0.1000000000, 0.1000000000]) {
				translate(v = [0, 0, 1490.0000000000]) {
					linear_extrude(height = 686.1000000000) {
						polygon(paths = [[0, 1, 2, 3]], points = [[2375, 1845], [2375, 2015], [2545, 2015], [2545, 1845]]);
					}
				}
			}
			color(c = [0.1000000000, 0.1000000000, 0.1000000000]) {
				translate(v = [0, 0, 1490.0000000000]) {
					linear_extrude(height = 686.1000000000) {
						polygon(paths = [[0, 1, 2, 3]], points = [[1945, 1875], [1945, 2045], [2115, 2045], [2115, 1875]]);
					}
				}
			}
			color(c = [0.1000000000, 0.1000000000, 0.1000000000]) {
				translate(v = [0, 0, 1490.0000000000]) {
					linear_extrude(height = 686.1000000000) {
						polygon(paths = [[0, 1, 2, 3]], points = [[605, 1915], [605, 2085], [775, 2085], [775, 1915]]);
					}
				}
			}
			color(c = [0.1000000000, 0.1000000000, 0.1000000000]) {
				translate(v = [0, 0, 1490.0000000000]) {
					linear_extrude(height = 686.1000000000) {
						polygon(paths = [[0, 1, 2, 3]], points = [[1085, 2080], [1085, 2250], [1255, 2250], [1255, 2080]]);
					}
				}
			}
			color(c = [0.1000000000, 0.1000000000, 0.1000000000]) {
				translate(v = [0, 0, 1490.0000000000]) {
					linear_extrude(height = 686.1000000000) {
						polygon(paths = [[0, 1, 2, 3]], points = [[2375, 2185], [2375, 2355], [2545, 2355], [2545, 2185]]);
					}
				}
			}
			color(c = [0.1000000000, 0.1000000000, 0.1000000000]) {
				translate(v = [0, 0, 1490.0000000000]) {
					linear_extrude(height = 686.1000000000) {
						polygon(paths = [[0, 1, 2, 3]], points = [[175, 2215], [175, 2385], [345, 2385], [345, 2215]]);
					}
				}
			}
			color(c = [0.1000000000, 0.1000000000, 0.1000000000]) {
				translate(v = [0, 0, 1490.0000000000]) {
					linear_extrude(height = 686.1000000000) {
						polygon(paths = [[0, 1, 2, 3]], points = [[1945, 2215], [1945, 2385], [2115, 2385], [2115, 2215]]);
					}
				}
			}
			color(c = [0.1000000000, 0.1000000000, 0.1000000000]) {
				translate(v = [0, 0, 1490.0000000000]) {
					linear_extrude(height = 686.1000000000) {
						polygon(paths = [[0, 1, 2, 3]], points = [[605, 2255], [605, 2425], [775, 2425], [775, 2255]]);
					}
				}
			}
			color(c = [0.1000000000, 0.1000000000, 0.1000000000]) {
				translate(v = [0, 0, 1490.0000000000]) {
					linear_extrude(height = 686.1000000000) {
						polygon(paths = [[0, 1, 2, 3]], points = [[1515, 2255], [1515, 2425], [1685, 2425], [1685, 2255]]);
					}
				}
			}
			color(c = [0.9000000000, 0.6000000000, 0.6000000000]) {
				translate(v = [0, 0, 2176.1000000000]) {
					linear_extrude(height = 100.0000000000) {
						polygon(paths = [[0, 1, 2, 3, 4, 5, 6, 7, 8, 9, 10, 11, 12, 13, 14, 15]], points = [[0, -85], [0, 85], [555, 85], [555, 565], [830, 565], [830, 85], [1475, 85], [1475, 565], [1730, 565], [1730, 85], [2335, 85], [2335, 565], [2615, 565], [2615, 85], [2760, 85], [2760, -85]]);
					}
				}
			}
			color(c = [0.9000000000, 0.6000000000, 0.6000000000]) {
				translate(v = [0, 0, 2176.1000000000]) {
					linear_extrude(height = 100.0000000000) {
						polygon(paths = [[0, 1, 2, 3]], points = [[425, 755], [425, 1325], [775, 1325], [775, 755]]);
					}
				}
			}
			color(c = [0.9000000000, 0.6000000000, 0.6000000000]) {
				translate(v = [0, 0, 2176.1000000000]) {
					linear_extrude(height = 100.0000000000) {
						polygon(paths = [[0, 1, 2, 3, 4, 5, 6, 7, 8, 9, 10, 11, 12, 13]], points = [[85, 255], [85, 2465], [395, 2465], [395, 1665], [1115, 1665], [1115, 1245], [2085, 1245], [2085, 1075], [945, 1075], [945, 1495], [255, 1495], [255, 585], [385, 585], [385, 255]]);
					}
				}
			}
			color(c = [0.9000000000, 0.6000000000, 0.6000000000]) {
				translate(v = [0, 0, 2176.1000000000]) {
					linear_extrude(height = 100.0000000000) {
						polygon(paths = [[0, 1, 2, 3, 4, 5, 6, 7, 8, 9, 10, 11, 12, 13, 14, 15, 16, 17, 18, 19, 20, 21]], points = [[1010, 345], [1010, 905], [2255, 905], [2255, 1415], [1905, 1415], [1905, 1835], [1045, 1835], [1045, 2465], [1305, 2465], [1305, 2005], [1905, 2005], [1905, 2465], [2165, 2465], [2165, 1585], [2660, 1585], [2660, 735], [2165, 735], [2165, 345], [1905, 345], [1905, 735], [1305, 735], [1305, 345]]);
					}
				}
			}
			color(c = [0.9000000000, 0.6000000000, 0.6000000000]) {
				translate(v = [0, 0, 2176.1000000000]) {
					linear_extrude(height = 100.0000000000) {
						polygon(paths = [[0, 1, 2, 3, 4, 5, 6, 7, 8, 9, 10, 11, 12, 13, 14, 15]], points = [[2335, 1765], [2335, 2635], [1730, 2635], [1730, 2175], [1475, 2175], [1475, 2635], [875, 2635], [875, 1835], [565, 1835], [565, 2635], [0, 2635], [0, 2805], [2760, 2805], [2760, 2635], [2620, 2635], [2620, 1765]]);
					}
				}
			}
			color(c = [0.5000000000, 0.5000000000, 0.5000000000]) {
				translate(v = [0, 0, 2276.1000000000]) {
					linear_extrude(height = 340.0000000000) {
						polygon(paths = [[0, 1, 2, 3]], points = [[145, -85], [145, 85], [315, 85], [315, -85]]);
					}
				}
			}
			color(c = [0.5000000000, 0.5000000000, 0.5000000000]) {
				translate(v = [0, 0, 2276.1000000000]) {
					linear_extrude(height = 340.0000000000) {
						polygon(paths = [[0, 1, 2, 3]], points = [[605, -85], [605, 85], [775, 85], [775, -85]]);
					}
				}
			}
			color(c = [0.5000000000, 0.5000000000, 0.5000000000]) {
				translate(v = [0, 0, 2276.1000000000]) {
					linear_extrude(height = 340.0000000000) {
						polygon(paths = [[0, 1, 2, 3]], points = [[1065, -85], [1065, 85], [1235, 85], [1235, -85]]);
					}
				}
			}
			color(c = [0.5000000000, 0.5000000000, 0.5000000000]) {
				translate(v = [0, 0, 2276.1000000000]) {
					linear_extrude(height = 340.0000000000) {
						polygon(paths = [[0, 1, 2, 3]], points = [[1525, -85], [1525, 85], [1695, 85], [1695, -85]]);
					}
				}
			}
			color(c = [0.5000000000, 0.5000000000, 0.5000000000]) {
				translate(v = [0, 0, 2276.1000000000]) {
					linear_extrude(height = 340.0000000000) {
						polygon(paths = [[0, 1, 2, 3]], points = [[1985, -85], [1985, 85], [2155, 85], [2155, -85]]);
					}
				}
			}
			color(c = [0.5000000000, 0.5000000000, 0.5000000000]) {
				translate(v = [0, 0, 2276.1000000000]) {
					linear_extrude(height = 340.0000000000) {
						polygon(paths = [[0, 1, 2, 3]], points = [[2445, -85], [2445, 85], [2615, 85], [2615, -85]]);
					}
				}
			}
			color(c = [0.5000000000, 0.5000000000, 0.5000000000]) {
				translate(v = [0, 0, 2276.1000000000]) {
					linear_extrude(height = 340.0000000000) {
						polygon(paths = [[0, 1, 2, 3]], points = [[145, 2635], [145, 2805], [315, 2805], [315, 2635]]);
					}
				}
			}
			color(c = [0.5000000000, 0.5000000000, 0.5000000000]) {
				translate(v = [0, 0, 2276.1000000000]) {
					linear_extrude(height = 340.0000000000) {
						polygon(paths = [[0, 1, 2, 3]], points = [[605, 2635], [605, 2805], [775, 2805], [775, 2635]]);
					}
				}
			}
			color(c = [0.5000000000, 0.5000000000, 0.5000000000]) {
				translate(v = [0, 0, 2276.1000000000]) {
					linear_extrude(height = 340.0000000000) {
						polygon(paths = [[0, 1, 2, 3]], points = [[1065, 2635], [1065, 2805], [1235, 2805], [1235, 2635]]);
					}
				}
			}
			color(c = [0.5000000000, 0.5000000000, 0.5000000000]) {
				translate(v = [0, 0, 2276.1000000000]) {
					linear_extrude(height = 340.0000000000) {
						polygon(paths = [[0, 1, 2, 3]], points = [[1525, 2635], [1525, 2805], [1695, 2805], [1695, 2635]]);
					}
				}
			}
			color(c = [0.5000000000, 0.5000000000, 0.5000000000]) {
				translate(v = [0, 0, 2276.1000000000]) {
					linear_extrude(height = 340.0000000000) {
						polygon(paths = [[0, 1, 2, 3]], points = [[1985, 2635], [1985, 2805], [2155, 2805], [2155, 2635]]);
					}
				}
			}
			color(c = [0.5000000000, 0.5000000000, 0.5000000000]) {
				translate(v = [0, 0, 2276.1000000000]) {
					linear_extrude(height = 340.0000000000) {
						polygon(paths = [[0, 1, 2, 3]], points = [[2445, 2635], [2445, 2805], [2615, 2805], [2615, 2635]]);
					}
				}
			}
			color(c = [0.3000000000, 0.3000000000, 1]) {
				translate(v = [0, 0, 2616.1000000000]) {
					linear_extrude(height = 360.0000000000) {
						polygon(paths = [[0, 1, 2, 3]], points = [[0, -240], [0, 240], [2760, 240], [2760, -240]]);
					}
				}
			}
			color(c = [0.3000000000, 0.3000000000, 1]) {
				translate(v = [0, 0, 2616.1000000000]) {
					linear_extrude(height = 360.0000000000) {
						polygon(paths = [[0, 1, 2, 3]], points = [[0, 2480], [0, 2960], [2760, 2960], [2760, 2480]]);
					}
				}
			}
		}
	}
}
